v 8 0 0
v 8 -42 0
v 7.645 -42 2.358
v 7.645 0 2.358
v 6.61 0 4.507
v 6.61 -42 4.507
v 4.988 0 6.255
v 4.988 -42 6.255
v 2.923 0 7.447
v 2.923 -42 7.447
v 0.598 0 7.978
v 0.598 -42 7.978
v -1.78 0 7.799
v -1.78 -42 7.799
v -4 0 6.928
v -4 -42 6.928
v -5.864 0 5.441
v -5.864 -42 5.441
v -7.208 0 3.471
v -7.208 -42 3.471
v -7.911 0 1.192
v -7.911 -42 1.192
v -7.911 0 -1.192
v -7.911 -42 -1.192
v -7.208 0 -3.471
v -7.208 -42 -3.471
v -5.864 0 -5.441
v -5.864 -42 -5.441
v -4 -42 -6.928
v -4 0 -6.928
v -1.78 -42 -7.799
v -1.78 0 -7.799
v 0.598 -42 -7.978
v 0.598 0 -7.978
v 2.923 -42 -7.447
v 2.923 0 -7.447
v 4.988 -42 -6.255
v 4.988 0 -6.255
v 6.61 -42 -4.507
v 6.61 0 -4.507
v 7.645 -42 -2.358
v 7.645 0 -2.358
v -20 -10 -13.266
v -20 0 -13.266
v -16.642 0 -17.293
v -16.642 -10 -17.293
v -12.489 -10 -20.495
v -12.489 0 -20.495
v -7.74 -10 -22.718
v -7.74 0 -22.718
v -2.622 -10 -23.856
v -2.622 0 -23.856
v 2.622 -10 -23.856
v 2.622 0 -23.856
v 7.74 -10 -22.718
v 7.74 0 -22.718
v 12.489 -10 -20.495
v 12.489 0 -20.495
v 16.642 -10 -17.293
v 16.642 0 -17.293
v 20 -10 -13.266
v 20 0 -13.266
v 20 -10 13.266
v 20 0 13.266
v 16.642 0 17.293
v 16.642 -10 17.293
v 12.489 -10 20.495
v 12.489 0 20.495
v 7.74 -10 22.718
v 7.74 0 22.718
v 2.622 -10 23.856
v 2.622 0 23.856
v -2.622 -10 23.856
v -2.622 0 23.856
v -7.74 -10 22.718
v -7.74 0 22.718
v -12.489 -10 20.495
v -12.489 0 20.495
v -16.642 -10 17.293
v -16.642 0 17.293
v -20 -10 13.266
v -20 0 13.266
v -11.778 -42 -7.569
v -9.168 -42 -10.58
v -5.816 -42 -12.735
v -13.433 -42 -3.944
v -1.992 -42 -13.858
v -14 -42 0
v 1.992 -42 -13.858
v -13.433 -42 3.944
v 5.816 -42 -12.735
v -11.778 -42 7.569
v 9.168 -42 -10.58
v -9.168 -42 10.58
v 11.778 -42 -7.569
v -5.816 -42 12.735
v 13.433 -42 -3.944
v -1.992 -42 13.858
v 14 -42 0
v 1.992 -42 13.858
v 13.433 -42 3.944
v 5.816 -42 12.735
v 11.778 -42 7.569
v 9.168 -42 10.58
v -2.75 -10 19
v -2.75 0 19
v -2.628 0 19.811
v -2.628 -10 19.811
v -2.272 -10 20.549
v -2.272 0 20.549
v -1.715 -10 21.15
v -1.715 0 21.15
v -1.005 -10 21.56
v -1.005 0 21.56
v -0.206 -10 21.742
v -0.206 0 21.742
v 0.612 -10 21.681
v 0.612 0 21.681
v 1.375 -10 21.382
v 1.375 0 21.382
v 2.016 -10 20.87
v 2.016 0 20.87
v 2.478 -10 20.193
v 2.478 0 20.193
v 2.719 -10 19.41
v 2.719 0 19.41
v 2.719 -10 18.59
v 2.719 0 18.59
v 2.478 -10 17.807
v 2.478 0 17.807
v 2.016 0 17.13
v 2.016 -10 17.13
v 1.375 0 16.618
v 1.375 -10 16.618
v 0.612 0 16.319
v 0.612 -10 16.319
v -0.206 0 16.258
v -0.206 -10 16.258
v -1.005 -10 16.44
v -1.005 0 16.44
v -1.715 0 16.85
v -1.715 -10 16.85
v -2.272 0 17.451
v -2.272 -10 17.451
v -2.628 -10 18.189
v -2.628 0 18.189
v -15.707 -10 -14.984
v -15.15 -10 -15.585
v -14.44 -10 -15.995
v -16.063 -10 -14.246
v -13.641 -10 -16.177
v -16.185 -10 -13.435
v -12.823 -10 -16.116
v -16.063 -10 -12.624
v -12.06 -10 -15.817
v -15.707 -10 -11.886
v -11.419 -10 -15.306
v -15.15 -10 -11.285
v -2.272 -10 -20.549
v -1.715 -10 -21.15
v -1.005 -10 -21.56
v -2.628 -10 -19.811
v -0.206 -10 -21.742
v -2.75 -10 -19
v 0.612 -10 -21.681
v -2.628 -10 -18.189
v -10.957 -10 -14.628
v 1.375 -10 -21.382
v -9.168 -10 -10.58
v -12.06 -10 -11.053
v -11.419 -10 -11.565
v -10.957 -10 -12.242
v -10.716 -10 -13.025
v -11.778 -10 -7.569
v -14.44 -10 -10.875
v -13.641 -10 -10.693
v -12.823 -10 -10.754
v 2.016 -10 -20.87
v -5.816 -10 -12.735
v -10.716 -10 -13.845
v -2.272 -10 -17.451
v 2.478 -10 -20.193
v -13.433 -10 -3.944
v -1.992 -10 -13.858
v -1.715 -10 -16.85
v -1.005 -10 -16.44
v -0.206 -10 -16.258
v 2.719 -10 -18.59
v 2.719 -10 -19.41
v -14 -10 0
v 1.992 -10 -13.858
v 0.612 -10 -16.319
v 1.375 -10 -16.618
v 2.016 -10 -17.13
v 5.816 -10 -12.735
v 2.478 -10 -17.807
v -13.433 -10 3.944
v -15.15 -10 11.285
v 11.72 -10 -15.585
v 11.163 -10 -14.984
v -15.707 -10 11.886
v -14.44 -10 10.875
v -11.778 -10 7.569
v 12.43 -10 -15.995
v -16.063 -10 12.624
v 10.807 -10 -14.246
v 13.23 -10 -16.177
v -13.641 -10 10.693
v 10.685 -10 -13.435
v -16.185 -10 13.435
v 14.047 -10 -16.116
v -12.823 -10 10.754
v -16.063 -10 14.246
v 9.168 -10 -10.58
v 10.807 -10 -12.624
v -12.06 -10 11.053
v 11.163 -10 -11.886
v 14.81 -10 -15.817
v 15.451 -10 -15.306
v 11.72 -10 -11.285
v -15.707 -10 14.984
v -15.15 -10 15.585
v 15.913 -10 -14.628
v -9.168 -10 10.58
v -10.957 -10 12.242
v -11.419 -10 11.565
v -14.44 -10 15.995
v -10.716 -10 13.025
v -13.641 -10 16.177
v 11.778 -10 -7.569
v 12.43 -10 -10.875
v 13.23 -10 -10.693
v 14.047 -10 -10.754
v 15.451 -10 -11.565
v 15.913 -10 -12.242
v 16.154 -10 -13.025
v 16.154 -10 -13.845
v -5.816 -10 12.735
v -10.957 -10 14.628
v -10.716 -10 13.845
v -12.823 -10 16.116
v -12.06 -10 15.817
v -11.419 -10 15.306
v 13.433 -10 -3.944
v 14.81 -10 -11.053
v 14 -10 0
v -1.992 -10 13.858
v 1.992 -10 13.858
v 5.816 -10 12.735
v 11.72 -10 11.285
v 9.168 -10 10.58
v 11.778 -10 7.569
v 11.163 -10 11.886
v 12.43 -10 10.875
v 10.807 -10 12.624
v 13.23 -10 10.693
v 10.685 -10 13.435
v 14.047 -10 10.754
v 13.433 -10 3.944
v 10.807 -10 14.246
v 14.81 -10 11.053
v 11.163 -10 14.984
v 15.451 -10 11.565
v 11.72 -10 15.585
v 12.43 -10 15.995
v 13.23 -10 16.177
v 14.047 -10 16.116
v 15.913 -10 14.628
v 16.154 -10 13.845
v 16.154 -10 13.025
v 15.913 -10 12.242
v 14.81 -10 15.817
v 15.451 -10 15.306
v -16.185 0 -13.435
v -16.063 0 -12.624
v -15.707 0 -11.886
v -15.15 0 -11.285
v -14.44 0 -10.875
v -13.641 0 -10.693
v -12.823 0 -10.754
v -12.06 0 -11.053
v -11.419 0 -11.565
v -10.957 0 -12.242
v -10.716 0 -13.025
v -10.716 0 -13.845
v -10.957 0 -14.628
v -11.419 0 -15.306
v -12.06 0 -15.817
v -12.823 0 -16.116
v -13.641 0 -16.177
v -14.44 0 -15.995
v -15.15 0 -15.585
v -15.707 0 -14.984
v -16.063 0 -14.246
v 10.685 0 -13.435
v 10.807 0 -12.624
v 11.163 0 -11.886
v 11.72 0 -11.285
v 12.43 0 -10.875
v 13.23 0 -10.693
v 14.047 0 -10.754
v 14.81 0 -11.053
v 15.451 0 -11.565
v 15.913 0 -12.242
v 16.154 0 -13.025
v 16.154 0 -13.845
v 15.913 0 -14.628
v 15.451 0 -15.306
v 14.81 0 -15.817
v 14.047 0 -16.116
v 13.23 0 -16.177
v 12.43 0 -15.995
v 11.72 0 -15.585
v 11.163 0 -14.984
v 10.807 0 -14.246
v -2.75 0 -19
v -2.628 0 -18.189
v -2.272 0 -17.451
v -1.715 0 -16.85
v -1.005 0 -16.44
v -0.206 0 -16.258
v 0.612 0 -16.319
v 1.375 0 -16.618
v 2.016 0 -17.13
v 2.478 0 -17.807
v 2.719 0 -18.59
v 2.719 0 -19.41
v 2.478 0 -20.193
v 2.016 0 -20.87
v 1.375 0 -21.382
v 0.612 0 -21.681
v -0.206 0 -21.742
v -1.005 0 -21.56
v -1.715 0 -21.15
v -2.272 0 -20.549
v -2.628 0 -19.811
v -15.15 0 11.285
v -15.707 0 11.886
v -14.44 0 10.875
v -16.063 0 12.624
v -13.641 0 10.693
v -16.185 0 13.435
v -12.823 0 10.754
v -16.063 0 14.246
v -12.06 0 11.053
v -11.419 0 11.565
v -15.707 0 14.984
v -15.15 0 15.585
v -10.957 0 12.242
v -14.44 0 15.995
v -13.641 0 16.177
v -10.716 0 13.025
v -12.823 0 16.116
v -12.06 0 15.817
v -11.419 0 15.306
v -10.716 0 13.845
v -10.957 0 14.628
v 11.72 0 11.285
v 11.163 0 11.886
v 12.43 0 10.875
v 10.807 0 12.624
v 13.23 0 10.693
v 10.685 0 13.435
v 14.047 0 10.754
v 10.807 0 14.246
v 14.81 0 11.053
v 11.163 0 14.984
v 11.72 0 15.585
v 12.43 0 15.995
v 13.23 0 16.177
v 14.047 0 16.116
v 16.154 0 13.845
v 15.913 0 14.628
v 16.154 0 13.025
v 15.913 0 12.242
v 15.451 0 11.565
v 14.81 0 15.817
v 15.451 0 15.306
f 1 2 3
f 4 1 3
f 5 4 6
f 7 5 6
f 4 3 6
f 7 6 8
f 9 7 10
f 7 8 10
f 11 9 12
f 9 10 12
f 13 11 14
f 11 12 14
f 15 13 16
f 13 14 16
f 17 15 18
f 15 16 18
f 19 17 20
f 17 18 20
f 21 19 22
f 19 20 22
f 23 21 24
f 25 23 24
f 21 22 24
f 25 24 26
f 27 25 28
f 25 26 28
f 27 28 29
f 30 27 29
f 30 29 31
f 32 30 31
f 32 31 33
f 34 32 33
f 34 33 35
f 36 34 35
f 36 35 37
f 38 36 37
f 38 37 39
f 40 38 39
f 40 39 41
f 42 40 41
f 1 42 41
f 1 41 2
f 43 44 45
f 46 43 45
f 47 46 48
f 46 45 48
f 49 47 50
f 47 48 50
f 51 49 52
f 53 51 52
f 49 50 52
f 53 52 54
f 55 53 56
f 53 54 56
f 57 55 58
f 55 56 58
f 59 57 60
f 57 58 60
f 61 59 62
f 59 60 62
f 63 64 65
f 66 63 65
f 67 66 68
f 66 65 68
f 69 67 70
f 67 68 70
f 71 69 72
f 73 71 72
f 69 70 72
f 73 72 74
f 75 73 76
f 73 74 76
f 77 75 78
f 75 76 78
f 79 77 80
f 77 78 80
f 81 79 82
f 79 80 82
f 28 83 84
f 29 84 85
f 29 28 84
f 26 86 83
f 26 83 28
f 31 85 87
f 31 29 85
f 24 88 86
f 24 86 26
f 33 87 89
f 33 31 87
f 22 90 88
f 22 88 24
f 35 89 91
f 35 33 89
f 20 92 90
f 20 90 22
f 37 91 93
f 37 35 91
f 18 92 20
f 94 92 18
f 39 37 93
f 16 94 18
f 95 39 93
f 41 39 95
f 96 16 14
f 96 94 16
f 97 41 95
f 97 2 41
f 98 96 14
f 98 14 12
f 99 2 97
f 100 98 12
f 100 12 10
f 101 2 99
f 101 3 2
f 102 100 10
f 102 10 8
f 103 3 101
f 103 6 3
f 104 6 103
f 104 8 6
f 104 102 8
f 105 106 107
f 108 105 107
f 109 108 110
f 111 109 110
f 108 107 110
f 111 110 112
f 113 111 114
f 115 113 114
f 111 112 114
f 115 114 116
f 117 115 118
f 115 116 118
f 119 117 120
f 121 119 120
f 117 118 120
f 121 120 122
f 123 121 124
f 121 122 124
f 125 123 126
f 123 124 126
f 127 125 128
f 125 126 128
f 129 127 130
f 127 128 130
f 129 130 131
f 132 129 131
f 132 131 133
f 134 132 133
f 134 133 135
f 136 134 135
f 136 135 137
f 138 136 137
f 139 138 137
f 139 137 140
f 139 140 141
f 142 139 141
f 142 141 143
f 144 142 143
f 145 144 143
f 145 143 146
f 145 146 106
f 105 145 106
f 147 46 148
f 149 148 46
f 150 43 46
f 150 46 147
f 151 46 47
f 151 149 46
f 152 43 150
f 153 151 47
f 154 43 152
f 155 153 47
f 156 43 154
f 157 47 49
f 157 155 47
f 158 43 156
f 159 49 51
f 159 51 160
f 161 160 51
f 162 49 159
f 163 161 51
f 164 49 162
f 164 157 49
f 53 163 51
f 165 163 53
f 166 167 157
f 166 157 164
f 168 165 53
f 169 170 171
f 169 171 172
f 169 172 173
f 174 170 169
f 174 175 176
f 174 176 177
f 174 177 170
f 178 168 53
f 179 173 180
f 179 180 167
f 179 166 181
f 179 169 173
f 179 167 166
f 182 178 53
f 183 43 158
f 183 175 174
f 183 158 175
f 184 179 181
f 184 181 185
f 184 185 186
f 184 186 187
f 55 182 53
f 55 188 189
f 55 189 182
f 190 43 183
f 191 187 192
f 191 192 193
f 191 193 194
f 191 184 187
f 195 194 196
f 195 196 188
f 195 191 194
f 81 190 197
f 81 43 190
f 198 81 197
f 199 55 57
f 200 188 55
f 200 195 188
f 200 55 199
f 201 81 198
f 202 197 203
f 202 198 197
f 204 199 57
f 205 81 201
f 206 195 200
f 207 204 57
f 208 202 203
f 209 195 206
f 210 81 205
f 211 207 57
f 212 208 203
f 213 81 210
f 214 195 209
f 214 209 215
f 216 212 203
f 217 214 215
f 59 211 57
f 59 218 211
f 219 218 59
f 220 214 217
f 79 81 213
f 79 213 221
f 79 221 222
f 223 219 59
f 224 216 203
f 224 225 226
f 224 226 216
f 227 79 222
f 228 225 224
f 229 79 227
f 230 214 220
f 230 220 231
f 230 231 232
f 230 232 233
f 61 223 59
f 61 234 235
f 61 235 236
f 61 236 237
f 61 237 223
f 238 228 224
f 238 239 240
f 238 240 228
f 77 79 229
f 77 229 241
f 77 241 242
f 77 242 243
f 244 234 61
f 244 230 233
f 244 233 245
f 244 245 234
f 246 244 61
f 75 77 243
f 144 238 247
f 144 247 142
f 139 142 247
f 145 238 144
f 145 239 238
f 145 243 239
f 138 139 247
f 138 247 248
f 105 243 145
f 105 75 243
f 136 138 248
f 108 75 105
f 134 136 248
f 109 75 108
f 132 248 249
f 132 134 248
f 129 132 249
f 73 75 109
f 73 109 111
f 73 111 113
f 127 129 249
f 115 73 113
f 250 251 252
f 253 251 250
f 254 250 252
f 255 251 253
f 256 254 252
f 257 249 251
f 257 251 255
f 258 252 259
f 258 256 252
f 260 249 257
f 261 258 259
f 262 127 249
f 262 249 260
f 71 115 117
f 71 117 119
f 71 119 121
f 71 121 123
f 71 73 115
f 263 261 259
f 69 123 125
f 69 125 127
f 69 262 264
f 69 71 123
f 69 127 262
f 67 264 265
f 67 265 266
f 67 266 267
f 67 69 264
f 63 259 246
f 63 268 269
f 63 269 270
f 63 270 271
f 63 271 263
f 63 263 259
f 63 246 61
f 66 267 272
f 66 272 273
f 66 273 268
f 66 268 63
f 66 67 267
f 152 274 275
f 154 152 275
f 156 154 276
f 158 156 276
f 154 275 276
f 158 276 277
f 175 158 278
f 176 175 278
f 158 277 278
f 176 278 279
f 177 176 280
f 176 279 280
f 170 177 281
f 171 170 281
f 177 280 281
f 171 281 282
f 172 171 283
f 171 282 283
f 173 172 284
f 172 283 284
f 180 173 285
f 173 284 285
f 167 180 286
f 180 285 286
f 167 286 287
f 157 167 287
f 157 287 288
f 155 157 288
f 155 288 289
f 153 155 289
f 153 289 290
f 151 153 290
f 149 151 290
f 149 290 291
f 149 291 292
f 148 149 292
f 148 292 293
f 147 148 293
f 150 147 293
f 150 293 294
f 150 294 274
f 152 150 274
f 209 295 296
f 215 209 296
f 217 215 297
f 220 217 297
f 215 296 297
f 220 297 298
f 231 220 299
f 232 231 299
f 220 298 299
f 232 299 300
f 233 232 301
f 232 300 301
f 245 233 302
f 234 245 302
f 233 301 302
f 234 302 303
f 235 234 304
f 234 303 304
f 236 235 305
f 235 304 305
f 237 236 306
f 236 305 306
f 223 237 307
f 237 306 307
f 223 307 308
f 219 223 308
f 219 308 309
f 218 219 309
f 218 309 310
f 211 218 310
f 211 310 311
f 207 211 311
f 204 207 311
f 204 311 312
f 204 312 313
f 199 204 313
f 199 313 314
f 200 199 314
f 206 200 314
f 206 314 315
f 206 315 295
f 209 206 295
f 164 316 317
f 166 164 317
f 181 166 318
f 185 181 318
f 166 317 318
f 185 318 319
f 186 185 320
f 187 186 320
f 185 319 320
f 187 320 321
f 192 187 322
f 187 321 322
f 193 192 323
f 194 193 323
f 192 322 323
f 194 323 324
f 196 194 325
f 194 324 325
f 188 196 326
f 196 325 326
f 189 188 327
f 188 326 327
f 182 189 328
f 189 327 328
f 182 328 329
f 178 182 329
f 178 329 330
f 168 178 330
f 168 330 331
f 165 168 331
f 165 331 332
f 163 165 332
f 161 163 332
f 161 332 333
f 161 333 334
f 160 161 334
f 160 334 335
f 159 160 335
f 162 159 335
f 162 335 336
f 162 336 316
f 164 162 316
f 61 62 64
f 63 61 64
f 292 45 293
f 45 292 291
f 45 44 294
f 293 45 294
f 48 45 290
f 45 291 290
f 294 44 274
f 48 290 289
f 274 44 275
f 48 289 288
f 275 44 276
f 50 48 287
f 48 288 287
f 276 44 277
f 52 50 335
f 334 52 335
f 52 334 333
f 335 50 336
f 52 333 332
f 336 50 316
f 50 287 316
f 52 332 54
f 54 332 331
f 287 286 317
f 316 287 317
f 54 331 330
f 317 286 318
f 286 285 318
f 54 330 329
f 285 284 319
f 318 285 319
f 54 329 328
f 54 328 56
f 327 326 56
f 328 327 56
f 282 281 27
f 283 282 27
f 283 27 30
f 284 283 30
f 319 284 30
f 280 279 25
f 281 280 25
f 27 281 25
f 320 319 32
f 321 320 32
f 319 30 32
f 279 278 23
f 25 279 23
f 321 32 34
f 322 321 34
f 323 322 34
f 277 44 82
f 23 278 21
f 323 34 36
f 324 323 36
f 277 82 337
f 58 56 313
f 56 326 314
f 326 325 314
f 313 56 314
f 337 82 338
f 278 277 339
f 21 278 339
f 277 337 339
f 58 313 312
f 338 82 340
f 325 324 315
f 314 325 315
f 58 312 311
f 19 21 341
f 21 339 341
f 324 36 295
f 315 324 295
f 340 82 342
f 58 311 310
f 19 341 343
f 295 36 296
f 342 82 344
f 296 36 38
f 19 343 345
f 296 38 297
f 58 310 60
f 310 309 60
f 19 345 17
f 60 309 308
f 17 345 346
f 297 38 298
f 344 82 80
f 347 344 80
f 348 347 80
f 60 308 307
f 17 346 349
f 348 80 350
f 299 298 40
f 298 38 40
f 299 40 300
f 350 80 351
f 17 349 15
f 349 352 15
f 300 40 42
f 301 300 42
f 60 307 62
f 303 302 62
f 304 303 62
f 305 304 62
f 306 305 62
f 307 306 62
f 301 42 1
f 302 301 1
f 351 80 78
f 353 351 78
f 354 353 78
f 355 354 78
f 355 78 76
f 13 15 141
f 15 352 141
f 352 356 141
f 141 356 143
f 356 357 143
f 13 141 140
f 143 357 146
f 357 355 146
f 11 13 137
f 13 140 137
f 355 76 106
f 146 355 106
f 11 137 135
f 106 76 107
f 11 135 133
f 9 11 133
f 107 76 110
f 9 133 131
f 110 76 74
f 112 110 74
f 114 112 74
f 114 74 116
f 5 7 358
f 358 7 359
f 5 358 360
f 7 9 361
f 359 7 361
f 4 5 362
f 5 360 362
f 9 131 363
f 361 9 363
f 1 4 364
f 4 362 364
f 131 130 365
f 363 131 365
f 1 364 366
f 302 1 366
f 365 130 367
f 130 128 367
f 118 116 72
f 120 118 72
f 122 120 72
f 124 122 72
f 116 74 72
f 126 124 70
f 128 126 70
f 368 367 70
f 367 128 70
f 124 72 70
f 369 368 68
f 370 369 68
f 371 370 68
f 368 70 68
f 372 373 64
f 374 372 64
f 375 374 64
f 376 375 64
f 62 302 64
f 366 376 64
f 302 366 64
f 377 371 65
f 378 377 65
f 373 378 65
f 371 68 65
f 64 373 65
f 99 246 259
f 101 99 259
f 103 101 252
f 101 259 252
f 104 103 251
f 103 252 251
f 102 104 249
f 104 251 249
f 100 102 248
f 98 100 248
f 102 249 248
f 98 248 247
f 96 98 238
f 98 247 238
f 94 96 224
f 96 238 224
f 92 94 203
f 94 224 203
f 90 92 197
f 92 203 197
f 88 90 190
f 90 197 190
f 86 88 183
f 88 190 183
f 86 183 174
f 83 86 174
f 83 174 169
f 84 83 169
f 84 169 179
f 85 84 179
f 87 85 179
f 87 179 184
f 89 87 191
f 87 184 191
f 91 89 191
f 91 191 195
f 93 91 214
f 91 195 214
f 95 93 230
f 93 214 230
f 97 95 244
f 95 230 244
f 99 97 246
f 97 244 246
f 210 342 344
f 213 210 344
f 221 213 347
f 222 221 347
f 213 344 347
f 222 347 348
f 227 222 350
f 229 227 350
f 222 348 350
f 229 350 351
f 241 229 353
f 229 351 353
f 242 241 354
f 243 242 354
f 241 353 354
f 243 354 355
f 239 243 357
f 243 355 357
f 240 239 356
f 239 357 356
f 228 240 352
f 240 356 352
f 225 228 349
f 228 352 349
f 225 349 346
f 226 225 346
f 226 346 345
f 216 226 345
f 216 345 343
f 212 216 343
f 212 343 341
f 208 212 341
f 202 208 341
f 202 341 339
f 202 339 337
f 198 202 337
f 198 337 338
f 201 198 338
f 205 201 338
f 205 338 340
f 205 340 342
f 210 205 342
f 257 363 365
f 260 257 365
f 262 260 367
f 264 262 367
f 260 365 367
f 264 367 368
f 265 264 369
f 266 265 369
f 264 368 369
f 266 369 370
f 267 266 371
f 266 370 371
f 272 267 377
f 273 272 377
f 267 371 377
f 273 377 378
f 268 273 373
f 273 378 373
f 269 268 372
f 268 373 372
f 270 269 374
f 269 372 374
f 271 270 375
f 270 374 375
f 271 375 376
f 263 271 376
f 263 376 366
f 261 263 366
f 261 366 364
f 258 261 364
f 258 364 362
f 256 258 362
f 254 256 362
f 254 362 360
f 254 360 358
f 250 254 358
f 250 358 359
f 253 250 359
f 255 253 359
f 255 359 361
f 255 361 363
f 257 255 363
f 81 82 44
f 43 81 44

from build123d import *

# Parameters (mm, degrees)
F1_DEPTH = 10
F2_R     = 14
F3_DEPTH = 32
F4_R     = 8
F5_DEPTH = 42.001
F6_R     = 2.75
F7_DEPTH = 42.001


with BuildPart() as f1:
    # F0 (on Front) → F1 (new body)
    with BuildSketch(Plane.XZ):
        with BuildLine():
            Line((-20, 13.266499), (-20, -13.266499))
            ThreePointArc((-20, -13.266499), (0, -24), (20, -13.266499))
            Line((20, -13.266499), (20, 13.266499))
            ThreePointArc((20, 13.266499), (0, 24), (-20, 13.266499))
        make_face()
    extrude(amount=F1_DEPTH)

    # F2 (on face) → F3 (join)
    with BuildSketch(Plane.XZ.offset(10)):
        Circle(F2_R)
    extrude(amount=F3_DEPTH)

    # F4 (on face) → F5 (cut, through all)
    with BuildSketch(Plane.XZ.offset(42)):
        Circle(F4_R)
    extrude(amount=-F5_DEPTH, mode=Mode.SUBTRACT)

    # F6 (on face) → F7 (cut, through all)
    with BuildSketch(Plane(origin=(0, 0, 0), x_dir=(-1, 0, 0), z_dir=(0, 1, 0))):
        with Locations((0, 19)):
            Circle(F6_R)
        with Locations((-13.435029, 13.435029)):
            Circle(F6_R)
        with Locations((-13.435029, -13.435029)):
            Circle(F6_R)
        with Locations((0, -19)):
            Circle(F6_R)
        with Locations((13.435029, -13.435029)):
            Circle(F6_R)
        with Locations((13.435029, 13.435029)):
            Circle(F6_R)
    extrude(amount=-F7_DEPTH, mode=Mode.SUBTRACT)


solid = f1.part
